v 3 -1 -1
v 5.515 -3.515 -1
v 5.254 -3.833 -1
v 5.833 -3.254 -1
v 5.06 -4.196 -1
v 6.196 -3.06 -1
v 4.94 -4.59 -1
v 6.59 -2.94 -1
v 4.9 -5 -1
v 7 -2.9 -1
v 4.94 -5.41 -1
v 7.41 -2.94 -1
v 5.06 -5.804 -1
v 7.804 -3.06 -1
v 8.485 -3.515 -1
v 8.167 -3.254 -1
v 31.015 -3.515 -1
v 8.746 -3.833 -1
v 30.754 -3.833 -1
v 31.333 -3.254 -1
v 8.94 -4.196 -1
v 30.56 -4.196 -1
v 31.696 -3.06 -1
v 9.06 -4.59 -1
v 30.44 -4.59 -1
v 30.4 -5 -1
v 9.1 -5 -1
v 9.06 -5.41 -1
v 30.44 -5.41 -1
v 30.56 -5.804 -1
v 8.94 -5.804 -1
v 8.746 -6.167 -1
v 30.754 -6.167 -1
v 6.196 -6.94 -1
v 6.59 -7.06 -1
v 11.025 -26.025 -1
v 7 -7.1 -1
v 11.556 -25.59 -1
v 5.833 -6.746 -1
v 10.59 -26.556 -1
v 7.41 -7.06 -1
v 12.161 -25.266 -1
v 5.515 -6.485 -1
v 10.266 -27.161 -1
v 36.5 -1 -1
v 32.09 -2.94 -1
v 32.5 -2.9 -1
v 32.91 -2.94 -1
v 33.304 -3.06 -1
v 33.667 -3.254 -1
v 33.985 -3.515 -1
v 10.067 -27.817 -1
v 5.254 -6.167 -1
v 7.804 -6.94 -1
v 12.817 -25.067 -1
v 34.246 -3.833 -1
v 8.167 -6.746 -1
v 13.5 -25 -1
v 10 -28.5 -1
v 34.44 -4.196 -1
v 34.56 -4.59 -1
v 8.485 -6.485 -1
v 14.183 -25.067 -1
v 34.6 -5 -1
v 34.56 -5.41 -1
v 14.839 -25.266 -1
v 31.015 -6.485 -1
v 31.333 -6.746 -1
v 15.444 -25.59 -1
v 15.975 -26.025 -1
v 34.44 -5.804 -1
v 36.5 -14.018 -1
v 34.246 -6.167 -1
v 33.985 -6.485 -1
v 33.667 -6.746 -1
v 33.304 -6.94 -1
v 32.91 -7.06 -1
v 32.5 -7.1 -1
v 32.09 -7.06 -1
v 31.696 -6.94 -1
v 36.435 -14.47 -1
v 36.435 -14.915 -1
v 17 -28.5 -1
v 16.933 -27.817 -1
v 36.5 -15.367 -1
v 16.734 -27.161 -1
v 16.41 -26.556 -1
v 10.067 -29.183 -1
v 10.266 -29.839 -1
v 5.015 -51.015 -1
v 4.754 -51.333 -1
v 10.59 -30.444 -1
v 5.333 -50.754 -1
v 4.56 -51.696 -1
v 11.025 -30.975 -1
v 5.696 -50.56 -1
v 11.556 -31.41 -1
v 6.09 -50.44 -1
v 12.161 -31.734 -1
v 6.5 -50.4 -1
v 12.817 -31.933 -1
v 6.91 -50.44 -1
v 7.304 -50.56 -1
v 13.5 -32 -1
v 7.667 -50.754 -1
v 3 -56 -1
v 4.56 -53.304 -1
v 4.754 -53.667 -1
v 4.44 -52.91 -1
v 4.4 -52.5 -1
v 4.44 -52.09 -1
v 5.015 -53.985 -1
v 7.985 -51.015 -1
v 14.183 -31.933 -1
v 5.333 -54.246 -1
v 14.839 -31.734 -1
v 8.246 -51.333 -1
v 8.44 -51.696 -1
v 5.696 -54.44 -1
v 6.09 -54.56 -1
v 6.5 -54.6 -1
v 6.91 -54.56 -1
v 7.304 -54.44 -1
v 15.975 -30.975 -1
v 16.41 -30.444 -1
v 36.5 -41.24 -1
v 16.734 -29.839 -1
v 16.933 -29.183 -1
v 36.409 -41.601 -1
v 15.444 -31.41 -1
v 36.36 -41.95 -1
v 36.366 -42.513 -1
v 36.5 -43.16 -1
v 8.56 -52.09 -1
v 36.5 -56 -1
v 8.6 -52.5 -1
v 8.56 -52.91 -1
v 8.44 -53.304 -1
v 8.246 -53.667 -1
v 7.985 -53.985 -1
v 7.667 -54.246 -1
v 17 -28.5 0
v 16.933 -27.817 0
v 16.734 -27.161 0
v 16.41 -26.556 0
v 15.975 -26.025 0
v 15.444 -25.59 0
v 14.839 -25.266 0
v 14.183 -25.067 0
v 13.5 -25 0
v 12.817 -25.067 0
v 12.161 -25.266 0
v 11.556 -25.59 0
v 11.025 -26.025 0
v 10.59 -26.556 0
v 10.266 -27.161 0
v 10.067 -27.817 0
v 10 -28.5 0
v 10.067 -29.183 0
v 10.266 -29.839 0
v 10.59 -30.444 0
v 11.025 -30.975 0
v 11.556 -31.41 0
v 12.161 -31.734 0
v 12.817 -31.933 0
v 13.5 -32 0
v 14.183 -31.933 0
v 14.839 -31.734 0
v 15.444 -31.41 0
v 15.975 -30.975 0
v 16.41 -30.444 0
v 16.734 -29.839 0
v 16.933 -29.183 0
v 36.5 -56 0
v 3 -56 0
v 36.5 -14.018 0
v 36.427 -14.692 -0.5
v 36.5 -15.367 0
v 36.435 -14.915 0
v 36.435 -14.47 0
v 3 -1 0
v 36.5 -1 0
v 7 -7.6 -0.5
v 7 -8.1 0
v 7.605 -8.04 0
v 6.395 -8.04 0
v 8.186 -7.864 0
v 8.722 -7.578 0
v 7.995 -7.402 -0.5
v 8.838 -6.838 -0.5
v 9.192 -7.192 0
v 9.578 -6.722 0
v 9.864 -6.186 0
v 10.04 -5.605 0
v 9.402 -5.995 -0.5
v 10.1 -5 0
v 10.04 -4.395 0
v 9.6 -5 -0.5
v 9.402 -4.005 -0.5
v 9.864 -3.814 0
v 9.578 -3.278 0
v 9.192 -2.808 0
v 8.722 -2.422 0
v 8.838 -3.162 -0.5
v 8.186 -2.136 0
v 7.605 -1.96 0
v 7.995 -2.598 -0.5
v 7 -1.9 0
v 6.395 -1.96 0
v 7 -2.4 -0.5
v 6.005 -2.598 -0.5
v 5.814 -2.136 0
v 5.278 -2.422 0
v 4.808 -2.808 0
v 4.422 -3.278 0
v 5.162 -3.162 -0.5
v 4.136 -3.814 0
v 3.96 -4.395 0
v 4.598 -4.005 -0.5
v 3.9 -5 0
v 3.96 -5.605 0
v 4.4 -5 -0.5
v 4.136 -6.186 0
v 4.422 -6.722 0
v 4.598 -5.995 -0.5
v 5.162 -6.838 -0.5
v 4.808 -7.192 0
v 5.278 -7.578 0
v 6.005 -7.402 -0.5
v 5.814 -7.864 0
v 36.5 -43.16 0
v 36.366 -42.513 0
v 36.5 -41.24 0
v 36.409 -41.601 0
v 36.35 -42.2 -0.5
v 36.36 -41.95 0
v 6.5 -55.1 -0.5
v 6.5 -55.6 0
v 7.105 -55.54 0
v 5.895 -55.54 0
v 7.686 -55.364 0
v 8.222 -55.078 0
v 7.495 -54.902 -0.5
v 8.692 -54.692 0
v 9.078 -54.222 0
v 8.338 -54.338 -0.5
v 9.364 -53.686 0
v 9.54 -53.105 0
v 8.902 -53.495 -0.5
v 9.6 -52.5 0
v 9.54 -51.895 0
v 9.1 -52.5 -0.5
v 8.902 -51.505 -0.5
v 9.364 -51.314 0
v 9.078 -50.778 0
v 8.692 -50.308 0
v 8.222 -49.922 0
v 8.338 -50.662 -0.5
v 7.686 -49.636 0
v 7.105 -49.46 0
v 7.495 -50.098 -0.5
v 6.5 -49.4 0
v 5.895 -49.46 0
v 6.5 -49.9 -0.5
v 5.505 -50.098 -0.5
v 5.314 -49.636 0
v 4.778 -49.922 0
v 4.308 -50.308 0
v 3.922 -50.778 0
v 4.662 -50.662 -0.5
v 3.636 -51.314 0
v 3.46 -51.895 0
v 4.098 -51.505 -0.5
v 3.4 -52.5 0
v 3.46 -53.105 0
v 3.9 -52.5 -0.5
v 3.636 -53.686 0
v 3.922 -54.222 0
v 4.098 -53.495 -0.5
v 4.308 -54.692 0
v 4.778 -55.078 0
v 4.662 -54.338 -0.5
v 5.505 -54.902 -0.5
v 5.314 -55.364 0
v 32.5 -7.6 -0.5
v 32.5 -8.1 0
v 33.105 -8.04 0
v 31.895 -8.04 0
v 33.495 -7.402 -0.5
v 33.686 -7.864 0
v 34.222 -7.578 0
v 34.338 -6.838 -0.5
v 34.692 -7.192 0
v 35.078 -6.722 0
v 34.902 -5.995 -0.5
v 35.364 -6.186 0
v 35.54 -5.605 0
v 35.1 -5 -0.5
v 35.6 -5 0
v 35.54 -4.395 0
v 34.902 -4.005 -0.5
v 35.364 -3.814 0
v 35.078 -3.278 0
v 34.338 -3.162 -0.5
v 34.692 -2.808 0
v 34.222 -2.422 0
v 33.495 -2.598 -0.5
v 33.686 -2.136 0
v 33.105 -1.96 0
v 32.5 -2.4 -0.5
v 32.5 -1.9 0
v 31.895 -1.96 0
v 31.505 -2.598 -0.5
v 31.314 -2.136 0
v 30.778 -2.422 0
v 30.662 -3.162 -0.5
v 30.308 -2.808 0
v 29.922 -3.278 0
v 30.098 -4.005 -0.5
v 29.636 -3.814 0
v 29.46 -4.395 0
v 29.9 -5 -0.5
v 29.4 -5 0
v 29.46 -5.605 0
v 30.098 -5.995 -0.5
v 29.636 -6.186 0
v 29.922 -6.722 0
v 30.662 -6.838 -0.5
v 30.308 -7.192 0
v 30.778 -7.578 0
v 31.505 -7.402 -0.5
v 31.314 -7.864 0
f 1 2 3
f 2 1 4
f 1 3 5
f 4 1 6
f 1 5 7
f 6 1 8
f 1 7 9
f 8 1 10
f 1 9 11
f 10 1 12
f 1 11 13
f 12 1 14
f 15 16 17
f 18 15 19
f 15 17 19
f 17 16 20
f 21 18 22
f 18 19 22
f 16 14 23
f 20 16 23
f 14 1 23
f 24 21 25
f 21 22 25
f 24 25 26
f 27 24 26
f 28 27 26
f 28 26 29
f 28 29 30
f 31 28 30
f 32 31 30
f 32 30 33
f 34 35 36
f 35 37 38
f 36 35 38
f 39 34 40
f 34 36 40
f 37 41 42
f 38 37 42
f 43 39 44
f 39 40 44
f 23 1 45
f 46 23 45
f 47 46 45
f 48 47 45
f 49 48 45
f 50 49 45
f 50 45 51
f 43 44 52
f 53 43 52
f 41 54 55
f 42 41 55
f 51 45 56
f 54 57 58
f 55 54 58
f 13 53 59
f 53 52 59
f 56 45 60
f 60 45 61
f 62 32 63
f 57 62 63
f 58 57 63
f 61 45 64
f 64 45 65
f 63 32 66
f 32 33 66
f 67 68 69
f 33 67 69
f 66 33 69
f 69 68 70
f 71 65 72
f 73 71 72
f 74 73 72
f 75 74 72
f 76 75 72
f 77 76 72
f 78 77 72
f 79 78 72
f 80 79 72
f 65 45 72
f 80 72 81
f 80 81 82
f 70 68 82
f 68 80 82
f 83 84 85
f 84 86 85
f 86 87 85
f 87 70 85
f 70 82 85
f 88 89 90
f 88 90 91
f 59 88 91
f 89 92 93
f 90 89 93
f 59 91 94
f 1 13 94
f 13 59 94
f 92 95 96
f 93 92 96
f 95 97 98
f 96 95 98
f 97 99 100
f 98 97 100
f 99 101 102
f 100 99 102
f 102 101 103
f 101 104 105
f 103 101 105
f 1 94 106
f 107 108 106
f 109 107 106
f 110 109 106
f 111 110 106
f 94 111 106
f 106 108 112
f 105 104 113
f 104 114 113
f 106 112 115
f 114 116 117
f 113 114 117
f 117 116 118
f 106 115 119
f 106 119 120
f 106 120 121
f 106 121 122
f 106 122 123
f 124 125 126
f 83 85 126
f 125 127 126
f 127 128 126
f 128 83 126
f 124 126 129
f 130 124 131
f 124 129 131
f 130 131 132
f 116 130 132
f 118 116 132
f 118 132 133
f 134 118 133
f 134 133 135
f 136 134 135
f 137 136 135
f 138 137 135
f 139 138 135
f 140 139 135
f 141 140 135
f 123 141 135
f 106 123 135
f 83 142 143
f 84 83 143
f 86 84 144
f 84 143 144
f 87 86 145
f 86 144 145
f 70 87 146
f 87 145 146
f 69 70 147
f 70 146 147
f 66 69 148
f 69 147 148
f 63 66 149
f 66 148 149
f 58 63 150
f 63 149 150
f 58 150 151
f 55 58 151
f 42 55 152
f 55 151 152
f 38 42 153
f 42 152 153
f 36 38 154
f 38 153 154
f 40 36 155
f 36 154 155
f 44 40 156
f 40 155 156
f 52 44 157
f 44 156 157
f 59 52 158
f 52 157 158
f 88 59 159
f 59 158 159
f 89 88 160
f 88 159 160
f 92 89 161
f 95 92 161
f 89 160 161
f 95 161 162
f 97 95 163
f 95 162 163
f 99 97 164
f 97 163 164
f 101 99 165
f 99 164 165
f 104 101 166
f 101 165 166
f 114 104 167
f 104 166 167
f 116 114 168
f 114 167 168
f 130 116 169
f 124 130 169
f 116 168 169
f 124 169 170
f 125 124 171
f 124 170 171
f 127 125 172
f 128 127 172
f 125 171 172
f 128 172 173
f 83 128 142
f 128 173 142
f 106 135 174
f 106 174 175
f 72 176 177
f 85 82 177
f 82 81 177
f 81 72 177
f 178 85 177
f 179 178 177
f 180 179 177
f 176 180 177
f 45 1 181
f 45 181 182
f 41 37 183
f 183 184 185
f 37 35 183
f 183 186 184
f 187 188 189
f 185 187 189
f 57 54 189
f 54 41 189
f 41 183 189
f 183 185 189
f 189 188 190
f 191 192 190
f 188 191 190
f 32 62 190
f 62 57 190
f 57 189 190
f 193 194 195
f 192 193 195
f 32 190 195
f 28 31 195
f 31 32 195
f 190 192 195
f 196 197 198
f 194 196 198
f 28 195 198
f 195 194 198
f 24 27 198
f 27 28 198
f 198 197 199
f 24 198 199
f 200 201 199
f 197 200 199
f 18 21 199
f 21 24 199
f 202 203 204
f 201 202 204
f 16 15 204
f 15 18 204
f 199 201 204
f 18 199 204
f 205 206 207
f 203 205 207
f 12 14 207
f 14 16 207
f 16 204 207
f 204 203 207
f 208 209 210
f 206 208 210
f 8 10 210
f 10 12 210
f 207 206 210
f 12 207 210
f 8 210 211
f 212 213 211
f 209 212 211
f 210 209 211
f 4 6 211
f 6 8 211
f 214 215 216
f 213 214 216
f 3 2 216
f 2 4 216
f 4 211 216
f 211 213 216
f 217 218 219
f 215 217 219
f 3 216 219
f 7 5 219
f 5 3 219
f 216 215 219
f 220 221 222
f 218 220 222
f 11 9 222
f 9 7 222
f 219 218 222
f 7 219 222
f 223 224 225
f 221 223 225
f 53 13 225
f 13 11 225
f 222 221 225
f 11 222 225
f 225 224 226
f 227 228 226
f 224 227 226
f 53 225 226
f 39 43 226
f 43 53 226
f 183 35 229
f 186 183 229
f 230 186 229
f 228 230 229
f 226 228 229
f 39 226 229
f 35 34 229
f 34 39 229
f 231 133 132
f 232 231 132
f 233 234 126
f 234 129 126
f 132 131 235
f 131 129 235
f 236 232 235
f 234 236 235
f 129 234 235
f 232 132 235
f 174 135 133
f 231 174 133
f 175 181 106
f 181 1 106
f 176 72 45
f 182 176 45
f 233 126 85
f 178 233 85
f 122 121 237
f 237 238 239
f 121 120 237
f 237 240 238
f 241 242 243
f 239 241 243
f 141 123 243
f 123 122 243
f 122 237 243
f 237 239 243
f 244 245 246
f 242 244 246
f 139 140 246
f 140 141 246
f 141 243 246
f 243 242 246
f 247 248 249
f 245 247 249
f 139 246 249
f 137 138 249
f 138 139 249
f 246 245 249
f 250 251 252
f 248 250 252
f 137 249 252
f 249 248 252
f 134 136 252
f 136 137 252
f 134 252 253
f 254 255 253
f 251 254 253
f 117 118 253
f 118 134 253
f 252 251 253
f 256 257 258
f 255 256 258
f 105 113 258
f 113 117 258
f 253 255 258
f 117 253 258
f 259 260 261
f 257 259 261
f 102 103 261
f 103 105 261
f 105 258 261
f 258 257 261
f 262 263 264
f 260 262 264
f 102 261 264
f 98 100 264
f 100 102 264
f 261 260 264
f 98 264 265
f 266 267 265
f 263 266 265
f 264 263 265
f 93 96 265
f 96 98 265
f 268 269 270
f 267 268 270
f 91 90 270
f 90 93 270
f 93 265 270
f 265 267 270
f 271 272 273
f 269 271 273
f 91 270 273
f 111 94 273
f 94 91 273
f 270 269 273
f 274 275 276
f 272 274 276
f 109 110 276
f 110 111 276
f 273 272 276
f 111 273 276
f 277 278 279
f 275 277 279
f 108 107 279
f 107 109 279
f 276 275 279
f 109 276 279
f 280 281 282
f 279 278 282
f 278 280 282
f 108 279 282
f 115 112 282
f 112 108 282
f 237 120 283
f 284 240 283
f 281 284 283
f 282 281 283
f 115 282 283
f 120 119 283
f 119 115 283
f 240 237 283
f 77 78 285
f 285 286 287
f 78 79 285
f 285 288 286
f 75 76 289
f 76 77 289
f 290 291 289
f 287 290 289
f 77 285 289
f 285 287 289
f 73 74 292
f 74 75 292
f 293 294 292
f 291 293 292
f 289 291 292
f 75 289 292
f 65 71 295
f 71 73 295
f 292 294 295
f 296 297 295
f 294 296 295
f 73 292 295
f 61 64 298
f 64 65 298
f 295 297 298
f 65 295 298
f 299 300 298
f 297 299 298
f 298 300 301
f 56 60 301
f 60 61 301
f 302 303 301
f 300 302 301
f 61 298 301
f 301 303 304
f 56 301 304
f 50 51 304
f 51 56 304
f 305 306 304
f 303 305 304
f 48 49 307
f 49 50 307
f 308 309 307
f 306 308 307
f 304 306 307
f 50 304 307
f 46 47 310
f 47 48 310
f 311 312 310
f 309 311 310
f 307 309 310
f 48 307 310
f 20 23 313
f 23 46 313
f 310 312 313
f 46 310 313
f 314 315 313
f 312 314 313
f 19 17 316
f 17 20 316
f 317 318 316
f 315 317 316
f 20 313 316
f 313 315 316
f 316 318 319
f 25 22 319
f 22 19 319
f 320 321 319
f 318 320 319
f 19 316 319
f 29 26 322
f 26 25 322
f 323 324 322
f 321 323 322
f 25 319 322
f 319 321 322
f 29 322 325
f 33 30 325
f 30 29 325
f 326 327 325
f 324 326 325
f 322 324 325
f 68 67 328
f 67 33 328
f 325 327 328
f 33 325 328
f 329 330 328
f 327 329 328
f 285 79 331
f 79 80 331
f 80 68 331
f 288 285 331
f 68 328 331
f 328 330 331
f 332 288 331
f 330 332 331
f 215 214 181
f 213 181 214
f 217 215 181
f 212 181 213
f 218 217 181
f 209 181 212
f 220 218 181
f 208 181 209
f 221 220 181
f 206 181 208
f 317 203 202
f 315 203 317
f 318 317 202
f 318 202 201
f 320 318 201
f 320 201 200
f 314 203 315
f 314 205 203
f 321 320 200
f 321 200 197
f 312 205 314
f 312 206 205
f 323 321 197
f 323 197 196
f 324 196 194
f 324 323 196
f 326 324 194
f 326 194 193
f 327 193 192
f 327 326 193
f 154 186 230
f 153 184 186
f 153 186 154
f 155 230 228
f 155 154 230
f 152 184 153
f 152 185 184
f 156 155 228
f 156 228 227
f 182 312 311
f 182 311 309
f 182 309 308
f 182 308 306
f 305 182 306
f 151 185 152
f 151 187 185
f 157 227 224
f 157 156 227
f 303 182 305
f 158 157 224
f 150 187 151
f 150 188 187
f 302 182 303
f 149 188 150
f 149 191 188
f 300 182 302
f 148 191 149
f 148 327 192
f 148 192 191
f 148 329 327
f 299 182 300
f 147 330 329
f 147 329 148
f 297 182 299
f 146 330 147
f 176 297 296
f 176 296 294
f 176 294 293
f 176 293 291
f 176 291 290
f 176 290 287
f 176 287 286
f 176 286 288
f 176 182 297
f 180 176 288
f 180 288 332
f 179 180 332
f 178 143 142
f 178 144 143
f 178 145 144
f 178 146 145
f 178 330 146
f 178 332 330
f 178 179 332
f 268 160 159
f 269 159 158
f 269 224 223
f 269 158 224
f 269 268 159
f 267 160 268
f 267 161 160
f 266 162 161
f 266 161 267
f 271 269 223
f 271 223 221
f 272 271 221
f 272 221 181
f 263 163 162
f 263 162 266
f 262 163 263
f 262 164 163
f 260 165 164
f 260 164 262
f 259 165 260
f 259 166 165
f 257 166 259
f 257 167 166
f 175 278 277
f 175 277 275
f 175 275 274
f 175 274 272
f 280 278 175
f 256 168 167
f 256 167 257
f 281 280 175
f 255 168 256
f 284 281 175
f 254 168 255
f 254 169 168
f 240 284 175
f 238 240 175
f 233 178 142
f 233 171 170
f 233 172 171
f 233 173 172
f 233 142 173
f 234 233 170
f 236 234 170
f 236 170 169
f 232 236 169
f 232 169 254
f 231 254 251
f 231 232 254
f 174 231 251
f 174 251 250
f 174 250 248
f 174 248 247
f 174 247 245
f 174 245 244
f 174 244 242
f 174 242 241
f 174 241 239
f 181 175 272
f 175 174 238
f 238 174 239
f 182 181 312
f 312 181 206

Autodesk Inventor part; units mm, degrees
ref_plane "YZ Plane" through (0, 0, 0) normal (1, 0, 0) x (0, 1, 0)
ref_plane "XZ Plane" through (0, 0, 0) normal (0, 1, 0) x (-1, 0, 0)
ref_plane "XY Plane" through (0, 0, 0) normal (0, 0, 1) x (1, 0, 0)
ref_plane "Work Plane1" through (3, 4, -1) normal (0, 0, 1) x (0, -1, 0)
sketch "Sketch1" plane through (3, 4, -1) normal (0, 0, 1) x (0, -1, 0)
  line L0 (18.0177, 33.5) -> (5, 33.5) projected
  line L1 (5, 0) -> (5, 33.5) projected
  line L2 (5, 0) -> (89.75, 0) projected
  line L3 (89.75, 0) -> (89.75, 33.5) projected
  line L4 (5, 0) -> (60, 0) projected
  line L5 (5, -3) -> (5, 0) projected
  line L6 (4, -3) -> (60, -3) projected
  line L7 (60, 33.5) -> (60, 3.25) projected
  line L8 (60, -3) -> (60, 0) projected
  arc A0 (63.25, 0) -> (60, 3.25) centre (63.25, 3.25) ccw projected
  line L9 (88.5, 0) -> (183, 0) projected
  circle A1 centre (75.375, 15.375) radius 6.75 projected
  line L10 (60, 0) -> (60, 33.5)
  circle A2 centre (32.5, 10.5) radius 5.5 projected
  circle A3 centre (9, 4) radius 2.1 projected
  circle A4 centre (9, 29.5) radius 2.1 projected
  circle A5 centre (56.5, 3.5) radius 2.1 projected
  spline S0 degree 2 poles (19.3669, 33.5) (18.6923, 33.3555) (18.0177, 33.5) knots 0 0 0 0.135703 0.135703 0.135703 weights 1 1.02375 1 projected
  line L11 (89.75, 33.5) -> (85.2105, 33.5) projected
  spline S1 degree 2 poles (85.2105, 33.5) (84.25, 33.2071) (83.2895, 33.5) knots 0 0 0 0.194422 0.194422 0.194422 weights 1 1.05 1 projected
  line L12 (83.2895, 33.5) -> (66.5855, 33.5) projected
  spline S2 degree 2 poles (66.5855, 33.5) (65.625, 33.2071) (64.6645, 33.5) knots 0 0 0 0.194422 0.194422 0.194422 weights 1 1.05 1 projected
  line L13 (64.6645, 33.5) -> (47.1605, 33.5) projected
  spline S3 degree 2 poles (47.1605, 33.5) (46.2, 33.2071) (45.2395, 33.5) knots 0 0 0 0.194422 0.194422 0.194422 weights 1 1.05 1 projected
  line L14 (45.2395, 33.5) -> (19.3669, 33.5) projected
  line L15 (63.25, 0) -> (88.5, 0) projected
  circle A6 centre (88.5, 3.25) radius 3.25 projected
  line L16 (183, 0) -> (183, 4.5) projected
  line L17 (183, 4.5) -> (137.8889, 33.5) projected
  line L18 (137.8889, 33.5) -> (60, 33.5) projected
  point P0 (52, 0)
  point P1 (64.076, 0)
  point P2 (87.674, 0)
  point P3 (63.25, 3.25)
  point P4 (60, 3.25)
  point P5 (60, 3.25)
extrude "Extrusion1" add sketch "Sketch1" along normal blind 1 contours S0 L14 S3 L13 L7 L10 L2 L1 L0 | A2 | A3 | A4 | A5
sketch "Sketch2" plane through (3, 4, 0) normal (0, 0, 1) x (1, 0, 0)
  line L0 (12.5287, -34.71) -> (8.4496, -34.6899)
  arc A0 (8.4713, -30.29) -> (8.4496, -34.6899) centre (10.5, -32.5) ccw
  line L1 (8.4713, -30.29) -> (12.5504, -30.3101)
  arc A1 (12.5287, -34.71) -> (12.5504, -30.3101) centre (10.5, -32.5) ccw
  circle A2 centre (10.5, -32.5) radius 3
  circle A3 centre (10.5, -32.5) radius 3.5
  point P0 (-3, -4)
  dimension "d5" = 0.5
extrude "Extrusion2" cut sketch "Sketch2" against normal up to next contours A2 L0 | L0 A0 L1 A1 | A2 L1 | A3
sketch "Sketch3" plane through (3, 4, 0) normal (0, 0, 1) x (1, 0, 0)
  circle A0 centre (10.5, -32.5) radius 3.5 projected
  line L0 (0, -5) -> (0, -60) projected
  line L1 (33.5, -18.0177) -> (33.5, -5) projected
  line L2 (33.5, -5) -> (0, -5) projected
  circle A1 centre (3.5, -56.5) radius 3.5
  circle A2 centre (4, -9) radius 4
  circle A3 centre (3.5, -56.5) radius 2.6
  circle A4 centre (4, -9) radius 2.6
  circle A5 centre (29.5, -9) radius 4
  circle A6 centre (29.5, -9) radius 2.6
  line L3 (33.5, -60) -> (33.5, -47.1605) projected
  line L4 (33.5, -45.2395) -> (33.5, -19.3669) projected
  line L5 (0, -60) -> (33.5, -60) projected
  point P0 (-3, -4)
  dimension "d8" = 7
  dimension "d17" = 8
  dimension "d18" = 5.2
  dimension "d19" = 5.2
  dimension "d20" = 4
  dimension "d21" = 4
  dimension "d22" = 8
  dimension "d23" = 5.2
  dimension "d24" = 4
  dimension "d25" = 4
hole "Hole1" at (6.5, -52.5, 0) at (7, -5, 0) at (32.5, -5, 0) direction (0, 0, -1) diameter 3.6 end through all countersink diameter 6.2 countersink angle 90 clearance for "Countersunk Flat Head Screw ISO 2009/7046" size "M3" standard "ISO"
properties part number "right_metal_gear_bracker"
